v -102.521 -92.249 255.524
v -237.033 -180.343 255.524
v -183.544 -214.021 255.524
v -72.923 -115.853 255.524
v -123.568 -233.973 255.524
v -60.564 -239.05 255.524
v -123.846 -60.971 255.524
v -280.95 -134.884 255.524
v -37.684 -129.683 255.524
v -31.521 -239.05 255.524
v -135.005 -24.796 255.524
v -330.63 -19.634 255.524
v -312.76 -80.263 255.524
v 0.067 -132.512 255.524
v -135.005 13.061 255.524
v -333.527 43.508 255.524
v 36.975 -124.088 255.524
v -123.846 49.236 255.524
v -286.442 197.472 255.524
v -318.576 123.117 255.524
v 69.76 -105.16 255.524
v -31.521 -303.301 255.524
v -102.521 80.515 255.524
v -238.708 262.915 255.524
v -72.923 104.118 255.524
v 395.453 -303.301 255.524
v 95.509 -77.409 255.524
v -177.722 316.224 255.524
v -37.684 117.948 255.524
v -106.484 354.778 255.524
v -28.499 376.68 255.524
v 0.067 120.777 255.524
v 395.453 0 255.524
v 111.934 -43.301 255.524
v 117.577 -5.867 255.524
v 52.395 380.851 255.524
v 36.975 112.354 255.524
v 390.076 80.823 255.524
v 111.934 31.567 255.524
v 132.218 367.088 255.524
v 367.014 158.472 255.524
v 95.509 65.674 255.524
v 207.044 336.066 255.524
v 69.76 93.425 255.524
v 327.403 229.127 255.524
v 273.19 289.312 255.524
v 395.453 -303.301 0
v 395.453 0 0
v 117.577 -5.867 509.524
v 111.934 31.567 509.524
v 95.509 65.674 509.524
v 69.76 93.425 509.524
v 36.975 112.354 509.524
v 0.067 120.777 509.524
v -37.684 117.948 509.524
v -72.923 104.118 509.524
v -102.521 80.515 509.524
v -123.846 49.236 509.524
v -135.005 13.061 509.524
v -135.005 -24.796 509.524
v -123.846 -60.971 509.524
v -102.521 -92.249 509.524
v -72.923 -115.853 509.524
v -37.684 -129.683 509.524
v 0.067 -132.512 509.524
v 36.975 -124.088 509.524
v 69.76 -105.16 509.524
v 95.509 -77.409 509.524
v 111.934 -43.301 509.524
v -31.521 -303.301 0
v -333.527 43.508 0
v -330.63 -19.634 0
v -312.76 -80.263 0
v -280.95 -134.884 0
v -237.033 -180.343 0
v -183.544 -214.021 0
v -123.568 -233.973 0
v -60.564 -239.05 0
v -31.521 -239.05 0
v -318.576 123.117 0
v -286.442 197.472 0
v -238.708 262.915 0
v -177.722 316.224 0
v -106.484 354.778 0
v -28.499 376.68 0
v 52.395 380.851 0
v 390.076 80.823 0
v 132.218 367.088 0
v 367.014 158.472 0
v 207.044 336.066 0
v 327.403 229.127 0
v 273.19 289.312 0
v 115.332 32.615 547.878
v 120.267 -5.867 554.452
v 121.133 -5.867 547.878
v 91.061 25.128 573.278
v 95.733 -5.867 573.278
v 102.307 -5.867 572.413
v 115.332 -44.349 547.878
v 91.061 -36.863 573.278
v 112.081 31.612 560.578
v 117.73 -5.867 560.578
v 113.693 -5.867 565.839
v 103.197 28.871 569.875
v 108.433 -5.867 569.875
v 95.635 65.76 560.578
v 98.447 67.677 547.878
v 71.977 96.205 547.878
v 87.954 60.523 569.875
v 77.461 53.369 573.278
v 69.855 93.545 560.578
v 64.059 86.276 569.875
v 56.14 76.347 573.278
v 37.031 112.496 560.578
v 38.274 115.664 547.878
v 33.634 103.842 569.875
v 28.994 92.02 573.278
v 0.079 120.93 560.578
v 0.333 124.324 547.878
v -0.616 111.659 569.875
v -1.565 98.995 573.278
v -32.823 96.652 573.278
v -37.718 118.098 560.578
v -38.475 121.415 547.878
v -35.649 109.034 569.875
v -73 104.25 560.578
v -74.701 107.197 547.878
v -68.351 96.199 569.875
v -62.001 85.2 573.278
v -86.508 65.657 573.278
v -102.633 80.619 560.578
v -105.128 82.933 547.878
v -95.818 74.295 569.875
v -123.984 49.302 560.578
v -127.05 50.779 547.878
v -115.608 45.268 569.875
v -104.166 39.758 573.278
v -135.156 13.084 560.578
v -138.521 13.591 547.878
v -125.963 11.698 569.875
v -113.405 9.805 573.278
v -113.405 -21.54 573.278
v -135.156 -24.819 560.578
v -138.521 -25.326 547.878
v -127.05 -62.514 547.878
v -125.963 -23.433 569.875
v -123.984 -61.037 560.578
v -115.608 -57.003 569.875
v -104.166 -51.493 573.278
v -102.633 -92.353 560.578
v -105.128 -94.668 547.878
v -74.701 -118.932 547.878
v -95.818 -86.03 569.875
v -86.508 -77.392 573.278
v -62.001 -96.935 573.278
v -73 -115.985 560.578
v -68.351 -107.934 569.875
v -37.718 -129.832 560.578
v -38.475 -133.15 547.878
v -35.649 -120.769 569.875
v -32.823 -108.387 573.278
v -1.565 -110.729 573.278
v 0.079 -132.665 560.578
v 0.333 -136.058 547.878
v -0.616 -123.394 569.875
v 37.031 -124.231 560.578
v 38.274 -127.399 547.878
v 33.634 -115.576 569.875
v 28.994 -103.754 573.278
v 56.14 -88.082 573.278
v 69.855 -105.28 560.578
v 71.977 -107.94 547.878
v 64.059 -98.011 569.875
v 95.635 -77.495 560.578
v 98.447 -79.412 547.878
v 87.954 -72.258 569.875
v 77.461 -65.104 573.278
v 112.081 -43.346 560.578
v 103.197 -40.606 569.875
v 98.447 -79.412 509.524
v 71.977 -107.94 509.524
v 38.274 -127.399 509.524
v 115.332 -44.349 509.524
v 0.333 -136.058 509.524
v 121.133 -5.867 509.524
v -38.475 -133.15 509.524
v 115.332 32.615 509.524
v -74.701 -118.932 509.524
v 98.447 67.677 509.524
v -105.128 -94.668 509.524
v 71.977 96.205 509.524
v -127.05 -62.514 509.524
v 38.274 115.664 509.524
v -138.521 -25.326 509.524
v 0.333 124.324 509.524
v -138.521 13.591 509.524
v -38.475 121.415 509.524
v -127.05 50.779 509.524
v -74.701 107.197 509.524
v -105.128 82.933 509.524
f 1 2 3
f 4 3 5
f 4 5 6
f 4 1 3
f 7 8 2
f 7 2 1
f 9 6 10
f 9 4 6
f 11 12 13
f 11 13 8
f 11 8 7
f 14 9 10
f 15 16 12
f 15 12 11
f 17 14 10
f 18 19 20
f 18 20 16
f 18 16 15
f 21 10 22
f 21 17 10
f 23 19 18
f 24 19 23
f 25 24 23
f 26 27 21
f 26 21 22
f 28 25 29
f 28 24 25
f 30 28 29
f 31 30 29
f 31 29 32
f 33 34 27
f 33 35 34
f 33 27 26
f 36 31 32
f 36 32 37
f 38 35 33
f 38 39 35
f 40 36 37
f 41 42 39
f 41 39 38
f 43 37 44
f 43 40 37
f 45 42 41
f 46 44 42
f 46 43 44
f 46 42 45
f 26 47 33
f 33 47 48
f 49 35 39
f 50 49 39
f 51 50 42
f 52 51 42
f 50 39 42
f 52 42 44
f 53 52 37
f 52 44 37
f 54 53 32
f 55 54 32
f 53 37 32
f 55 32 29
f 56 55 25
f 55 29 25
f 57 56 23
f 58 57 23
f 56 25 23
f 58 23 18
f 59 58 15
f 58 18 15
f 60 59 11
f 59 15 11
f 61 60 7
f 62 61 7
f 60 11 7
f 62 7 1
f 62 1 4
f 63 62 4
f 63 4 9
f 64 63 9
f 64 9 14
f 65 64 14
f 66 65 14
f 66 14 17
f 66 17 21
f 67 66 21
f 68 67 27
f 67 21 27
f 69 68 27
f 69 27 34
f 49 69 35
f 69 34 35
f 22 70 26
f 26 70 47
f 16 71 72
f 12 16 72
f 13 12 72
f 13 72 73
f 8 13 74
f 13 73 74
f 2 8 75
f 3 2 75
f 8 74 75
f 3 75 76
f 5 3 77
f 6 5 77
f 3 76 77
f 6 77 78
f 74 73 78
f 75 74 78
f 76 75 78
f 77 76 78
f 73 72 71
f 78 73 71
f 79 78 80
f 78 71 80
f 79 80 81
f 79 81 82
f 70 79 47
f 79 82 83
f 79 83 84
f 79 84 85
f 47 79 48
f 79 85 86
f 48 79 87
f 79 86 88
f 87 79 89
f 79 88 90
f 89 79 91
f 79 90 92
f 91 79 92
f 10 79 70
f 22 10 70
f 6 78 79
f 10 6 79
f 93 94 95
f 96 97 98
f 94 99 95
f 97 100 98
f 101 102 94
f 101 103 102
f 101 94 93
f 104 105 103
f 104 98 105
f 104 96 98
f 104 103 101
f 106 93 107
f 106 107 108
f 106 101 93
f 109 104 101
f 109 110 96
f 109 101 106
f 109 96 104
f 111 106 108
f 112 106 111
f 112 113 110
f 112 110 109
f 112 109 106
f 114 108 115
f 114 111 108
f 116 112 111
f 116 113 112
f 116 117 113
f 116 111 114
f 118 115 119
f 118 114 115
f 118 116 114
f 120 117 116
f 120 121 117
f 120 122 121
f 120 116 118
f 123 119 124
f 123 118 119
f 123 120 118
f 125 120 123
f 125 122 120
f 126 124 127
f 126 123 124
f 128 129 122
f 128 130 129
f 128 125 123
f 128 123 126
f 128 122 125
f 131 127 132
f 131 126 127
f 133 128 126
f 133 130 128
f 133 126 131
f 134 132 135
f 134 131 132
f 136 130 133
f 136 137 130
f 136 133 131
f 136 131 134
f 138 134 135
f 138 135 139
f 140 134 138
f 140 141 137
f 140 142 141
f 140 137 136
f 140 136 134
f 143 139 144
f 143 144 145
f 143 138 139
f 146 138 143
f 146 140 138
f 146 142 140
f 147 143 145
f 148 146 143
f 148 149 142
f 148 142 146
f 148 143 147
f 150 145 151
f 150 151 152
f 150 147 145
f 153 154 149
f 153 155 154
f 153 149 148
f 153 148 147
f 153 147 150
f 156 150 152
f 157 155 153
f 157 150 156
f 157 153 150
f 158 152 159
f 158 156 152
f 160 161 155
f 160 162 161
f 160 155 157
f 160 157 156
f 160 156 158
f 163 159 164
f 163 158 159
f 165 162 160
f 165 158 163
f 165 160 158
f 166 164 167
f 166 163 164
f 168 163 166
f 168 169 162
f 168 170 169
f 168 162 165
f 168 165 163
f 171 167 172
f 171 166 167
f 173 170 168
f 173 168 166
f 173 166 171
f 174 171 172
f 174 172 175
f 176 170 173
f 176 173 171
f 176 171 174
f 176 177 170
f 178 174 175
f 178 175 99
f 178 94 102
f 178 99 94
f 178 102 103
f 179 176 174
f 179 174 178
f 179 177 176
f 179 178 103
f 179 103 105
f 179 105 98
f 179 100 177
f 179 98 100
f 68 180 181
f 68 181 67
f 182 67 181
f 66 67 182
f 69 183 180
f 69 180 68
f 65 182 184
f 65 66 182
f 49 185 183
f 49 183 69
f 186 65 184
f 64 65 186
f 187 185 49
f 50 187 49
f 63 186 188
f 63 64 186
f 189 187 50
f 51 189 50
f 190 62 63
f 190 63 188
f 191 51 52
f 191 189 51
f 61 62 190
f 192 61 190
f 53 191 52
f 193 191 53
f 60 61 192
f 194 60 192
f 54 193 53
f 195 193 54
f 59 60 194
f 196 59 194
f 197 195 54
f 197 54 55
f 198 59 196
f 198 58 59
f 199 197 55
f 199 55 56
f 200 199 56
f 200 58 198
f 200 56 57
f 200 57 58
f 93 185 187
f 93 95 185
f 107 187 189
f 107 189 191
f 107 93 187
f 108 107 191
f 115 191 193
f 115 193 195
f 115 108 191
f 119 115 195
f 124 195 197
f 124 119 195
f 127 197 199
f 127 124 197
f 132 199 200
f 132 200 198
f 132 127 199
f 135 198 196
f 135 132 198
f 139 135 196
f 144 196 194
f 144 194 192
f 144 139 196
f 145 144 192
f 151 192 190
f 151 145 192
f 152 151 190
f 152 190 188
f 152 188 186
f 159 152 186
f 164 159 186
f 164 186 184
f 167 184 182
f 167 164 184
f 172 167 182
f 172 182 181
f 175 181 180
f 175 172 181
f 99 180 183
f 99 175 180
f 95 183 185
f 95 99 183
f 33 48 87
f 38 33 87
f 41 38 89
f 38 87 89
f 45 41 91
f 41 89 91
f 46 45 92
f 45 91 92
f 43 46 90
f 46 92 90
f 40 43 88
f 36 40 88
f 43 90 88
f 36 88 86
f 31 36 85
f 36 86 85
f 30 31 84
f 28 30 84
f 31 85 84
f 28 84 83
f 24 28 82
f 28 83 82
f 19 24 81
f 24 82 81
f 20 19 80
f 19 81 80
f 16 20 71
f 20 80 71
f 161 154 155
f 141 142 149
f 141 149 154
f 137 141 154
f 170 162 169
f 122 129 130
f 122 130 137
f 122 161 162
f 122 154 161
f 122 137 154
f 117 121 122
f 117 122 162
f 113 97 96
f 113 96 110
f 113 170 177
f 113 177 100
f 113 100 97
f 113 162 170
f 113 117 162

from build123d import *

# Parameters (mm, degrees)
F1_DEPTH = 255.524
F2_R     = 127
F3_DEPTH = 254


with BuildPart() as f1:
    # F0 (on Top) → F1 (new body)
    with BuildSketch(Plane.XY):
        with BuildLine():
            ThreePointArc((395.4526, 0), (52.394599, 380.85148), (-333.5274, 43.50766))
            ThreePointArc((-333.5274, 43.50766), (-260.361114, -158.936751), (-60.56376, -239.04956))
            Line((-60.56376, -239.04956), (-31.5214, -239.04956))
            Line((-31.5214, -239.04956), (-31.5214, -303.3014))
            Line((-31.5214, -303.3014), (395.4526, -303.3014))
            Line((395.4526, -303.3014), (395.4526, 0))
        make_face()
    extrude(amount=F1_DEPTH)

    # F2 (on face) → F3 (join)
    with BuildSketch(Plane.XY.offset(255.524)):
        with Locations((-9.4234, -5.8674)):
            Circle(F2_R)
    extrude(amount=F3_DEPTH)

    # F6 (on face) → F9 (revolve)
    with BuildSketch(Plane.XZ.offset(5.8674)):
        with BuildLine():
            Line((121.1326, 509.524), (121.1326, 547.878))
            ThreePointArc((121.1326, 547.878), (113.693112, 565.838512), (95.7326, 573.278))
            Line((95.7326, 573.278), (-9.4234, 573.278))
            Line((-9.4234, 573.278), (-9.4234, 509.524))
            Line((-9.4234, 509.524), (121.1326, 509.524))
        make_face()
    revolve(axis=Axis((-9.4234, -5.8674, 525.207323), (0, 0, 1)))


solid = f1.part
